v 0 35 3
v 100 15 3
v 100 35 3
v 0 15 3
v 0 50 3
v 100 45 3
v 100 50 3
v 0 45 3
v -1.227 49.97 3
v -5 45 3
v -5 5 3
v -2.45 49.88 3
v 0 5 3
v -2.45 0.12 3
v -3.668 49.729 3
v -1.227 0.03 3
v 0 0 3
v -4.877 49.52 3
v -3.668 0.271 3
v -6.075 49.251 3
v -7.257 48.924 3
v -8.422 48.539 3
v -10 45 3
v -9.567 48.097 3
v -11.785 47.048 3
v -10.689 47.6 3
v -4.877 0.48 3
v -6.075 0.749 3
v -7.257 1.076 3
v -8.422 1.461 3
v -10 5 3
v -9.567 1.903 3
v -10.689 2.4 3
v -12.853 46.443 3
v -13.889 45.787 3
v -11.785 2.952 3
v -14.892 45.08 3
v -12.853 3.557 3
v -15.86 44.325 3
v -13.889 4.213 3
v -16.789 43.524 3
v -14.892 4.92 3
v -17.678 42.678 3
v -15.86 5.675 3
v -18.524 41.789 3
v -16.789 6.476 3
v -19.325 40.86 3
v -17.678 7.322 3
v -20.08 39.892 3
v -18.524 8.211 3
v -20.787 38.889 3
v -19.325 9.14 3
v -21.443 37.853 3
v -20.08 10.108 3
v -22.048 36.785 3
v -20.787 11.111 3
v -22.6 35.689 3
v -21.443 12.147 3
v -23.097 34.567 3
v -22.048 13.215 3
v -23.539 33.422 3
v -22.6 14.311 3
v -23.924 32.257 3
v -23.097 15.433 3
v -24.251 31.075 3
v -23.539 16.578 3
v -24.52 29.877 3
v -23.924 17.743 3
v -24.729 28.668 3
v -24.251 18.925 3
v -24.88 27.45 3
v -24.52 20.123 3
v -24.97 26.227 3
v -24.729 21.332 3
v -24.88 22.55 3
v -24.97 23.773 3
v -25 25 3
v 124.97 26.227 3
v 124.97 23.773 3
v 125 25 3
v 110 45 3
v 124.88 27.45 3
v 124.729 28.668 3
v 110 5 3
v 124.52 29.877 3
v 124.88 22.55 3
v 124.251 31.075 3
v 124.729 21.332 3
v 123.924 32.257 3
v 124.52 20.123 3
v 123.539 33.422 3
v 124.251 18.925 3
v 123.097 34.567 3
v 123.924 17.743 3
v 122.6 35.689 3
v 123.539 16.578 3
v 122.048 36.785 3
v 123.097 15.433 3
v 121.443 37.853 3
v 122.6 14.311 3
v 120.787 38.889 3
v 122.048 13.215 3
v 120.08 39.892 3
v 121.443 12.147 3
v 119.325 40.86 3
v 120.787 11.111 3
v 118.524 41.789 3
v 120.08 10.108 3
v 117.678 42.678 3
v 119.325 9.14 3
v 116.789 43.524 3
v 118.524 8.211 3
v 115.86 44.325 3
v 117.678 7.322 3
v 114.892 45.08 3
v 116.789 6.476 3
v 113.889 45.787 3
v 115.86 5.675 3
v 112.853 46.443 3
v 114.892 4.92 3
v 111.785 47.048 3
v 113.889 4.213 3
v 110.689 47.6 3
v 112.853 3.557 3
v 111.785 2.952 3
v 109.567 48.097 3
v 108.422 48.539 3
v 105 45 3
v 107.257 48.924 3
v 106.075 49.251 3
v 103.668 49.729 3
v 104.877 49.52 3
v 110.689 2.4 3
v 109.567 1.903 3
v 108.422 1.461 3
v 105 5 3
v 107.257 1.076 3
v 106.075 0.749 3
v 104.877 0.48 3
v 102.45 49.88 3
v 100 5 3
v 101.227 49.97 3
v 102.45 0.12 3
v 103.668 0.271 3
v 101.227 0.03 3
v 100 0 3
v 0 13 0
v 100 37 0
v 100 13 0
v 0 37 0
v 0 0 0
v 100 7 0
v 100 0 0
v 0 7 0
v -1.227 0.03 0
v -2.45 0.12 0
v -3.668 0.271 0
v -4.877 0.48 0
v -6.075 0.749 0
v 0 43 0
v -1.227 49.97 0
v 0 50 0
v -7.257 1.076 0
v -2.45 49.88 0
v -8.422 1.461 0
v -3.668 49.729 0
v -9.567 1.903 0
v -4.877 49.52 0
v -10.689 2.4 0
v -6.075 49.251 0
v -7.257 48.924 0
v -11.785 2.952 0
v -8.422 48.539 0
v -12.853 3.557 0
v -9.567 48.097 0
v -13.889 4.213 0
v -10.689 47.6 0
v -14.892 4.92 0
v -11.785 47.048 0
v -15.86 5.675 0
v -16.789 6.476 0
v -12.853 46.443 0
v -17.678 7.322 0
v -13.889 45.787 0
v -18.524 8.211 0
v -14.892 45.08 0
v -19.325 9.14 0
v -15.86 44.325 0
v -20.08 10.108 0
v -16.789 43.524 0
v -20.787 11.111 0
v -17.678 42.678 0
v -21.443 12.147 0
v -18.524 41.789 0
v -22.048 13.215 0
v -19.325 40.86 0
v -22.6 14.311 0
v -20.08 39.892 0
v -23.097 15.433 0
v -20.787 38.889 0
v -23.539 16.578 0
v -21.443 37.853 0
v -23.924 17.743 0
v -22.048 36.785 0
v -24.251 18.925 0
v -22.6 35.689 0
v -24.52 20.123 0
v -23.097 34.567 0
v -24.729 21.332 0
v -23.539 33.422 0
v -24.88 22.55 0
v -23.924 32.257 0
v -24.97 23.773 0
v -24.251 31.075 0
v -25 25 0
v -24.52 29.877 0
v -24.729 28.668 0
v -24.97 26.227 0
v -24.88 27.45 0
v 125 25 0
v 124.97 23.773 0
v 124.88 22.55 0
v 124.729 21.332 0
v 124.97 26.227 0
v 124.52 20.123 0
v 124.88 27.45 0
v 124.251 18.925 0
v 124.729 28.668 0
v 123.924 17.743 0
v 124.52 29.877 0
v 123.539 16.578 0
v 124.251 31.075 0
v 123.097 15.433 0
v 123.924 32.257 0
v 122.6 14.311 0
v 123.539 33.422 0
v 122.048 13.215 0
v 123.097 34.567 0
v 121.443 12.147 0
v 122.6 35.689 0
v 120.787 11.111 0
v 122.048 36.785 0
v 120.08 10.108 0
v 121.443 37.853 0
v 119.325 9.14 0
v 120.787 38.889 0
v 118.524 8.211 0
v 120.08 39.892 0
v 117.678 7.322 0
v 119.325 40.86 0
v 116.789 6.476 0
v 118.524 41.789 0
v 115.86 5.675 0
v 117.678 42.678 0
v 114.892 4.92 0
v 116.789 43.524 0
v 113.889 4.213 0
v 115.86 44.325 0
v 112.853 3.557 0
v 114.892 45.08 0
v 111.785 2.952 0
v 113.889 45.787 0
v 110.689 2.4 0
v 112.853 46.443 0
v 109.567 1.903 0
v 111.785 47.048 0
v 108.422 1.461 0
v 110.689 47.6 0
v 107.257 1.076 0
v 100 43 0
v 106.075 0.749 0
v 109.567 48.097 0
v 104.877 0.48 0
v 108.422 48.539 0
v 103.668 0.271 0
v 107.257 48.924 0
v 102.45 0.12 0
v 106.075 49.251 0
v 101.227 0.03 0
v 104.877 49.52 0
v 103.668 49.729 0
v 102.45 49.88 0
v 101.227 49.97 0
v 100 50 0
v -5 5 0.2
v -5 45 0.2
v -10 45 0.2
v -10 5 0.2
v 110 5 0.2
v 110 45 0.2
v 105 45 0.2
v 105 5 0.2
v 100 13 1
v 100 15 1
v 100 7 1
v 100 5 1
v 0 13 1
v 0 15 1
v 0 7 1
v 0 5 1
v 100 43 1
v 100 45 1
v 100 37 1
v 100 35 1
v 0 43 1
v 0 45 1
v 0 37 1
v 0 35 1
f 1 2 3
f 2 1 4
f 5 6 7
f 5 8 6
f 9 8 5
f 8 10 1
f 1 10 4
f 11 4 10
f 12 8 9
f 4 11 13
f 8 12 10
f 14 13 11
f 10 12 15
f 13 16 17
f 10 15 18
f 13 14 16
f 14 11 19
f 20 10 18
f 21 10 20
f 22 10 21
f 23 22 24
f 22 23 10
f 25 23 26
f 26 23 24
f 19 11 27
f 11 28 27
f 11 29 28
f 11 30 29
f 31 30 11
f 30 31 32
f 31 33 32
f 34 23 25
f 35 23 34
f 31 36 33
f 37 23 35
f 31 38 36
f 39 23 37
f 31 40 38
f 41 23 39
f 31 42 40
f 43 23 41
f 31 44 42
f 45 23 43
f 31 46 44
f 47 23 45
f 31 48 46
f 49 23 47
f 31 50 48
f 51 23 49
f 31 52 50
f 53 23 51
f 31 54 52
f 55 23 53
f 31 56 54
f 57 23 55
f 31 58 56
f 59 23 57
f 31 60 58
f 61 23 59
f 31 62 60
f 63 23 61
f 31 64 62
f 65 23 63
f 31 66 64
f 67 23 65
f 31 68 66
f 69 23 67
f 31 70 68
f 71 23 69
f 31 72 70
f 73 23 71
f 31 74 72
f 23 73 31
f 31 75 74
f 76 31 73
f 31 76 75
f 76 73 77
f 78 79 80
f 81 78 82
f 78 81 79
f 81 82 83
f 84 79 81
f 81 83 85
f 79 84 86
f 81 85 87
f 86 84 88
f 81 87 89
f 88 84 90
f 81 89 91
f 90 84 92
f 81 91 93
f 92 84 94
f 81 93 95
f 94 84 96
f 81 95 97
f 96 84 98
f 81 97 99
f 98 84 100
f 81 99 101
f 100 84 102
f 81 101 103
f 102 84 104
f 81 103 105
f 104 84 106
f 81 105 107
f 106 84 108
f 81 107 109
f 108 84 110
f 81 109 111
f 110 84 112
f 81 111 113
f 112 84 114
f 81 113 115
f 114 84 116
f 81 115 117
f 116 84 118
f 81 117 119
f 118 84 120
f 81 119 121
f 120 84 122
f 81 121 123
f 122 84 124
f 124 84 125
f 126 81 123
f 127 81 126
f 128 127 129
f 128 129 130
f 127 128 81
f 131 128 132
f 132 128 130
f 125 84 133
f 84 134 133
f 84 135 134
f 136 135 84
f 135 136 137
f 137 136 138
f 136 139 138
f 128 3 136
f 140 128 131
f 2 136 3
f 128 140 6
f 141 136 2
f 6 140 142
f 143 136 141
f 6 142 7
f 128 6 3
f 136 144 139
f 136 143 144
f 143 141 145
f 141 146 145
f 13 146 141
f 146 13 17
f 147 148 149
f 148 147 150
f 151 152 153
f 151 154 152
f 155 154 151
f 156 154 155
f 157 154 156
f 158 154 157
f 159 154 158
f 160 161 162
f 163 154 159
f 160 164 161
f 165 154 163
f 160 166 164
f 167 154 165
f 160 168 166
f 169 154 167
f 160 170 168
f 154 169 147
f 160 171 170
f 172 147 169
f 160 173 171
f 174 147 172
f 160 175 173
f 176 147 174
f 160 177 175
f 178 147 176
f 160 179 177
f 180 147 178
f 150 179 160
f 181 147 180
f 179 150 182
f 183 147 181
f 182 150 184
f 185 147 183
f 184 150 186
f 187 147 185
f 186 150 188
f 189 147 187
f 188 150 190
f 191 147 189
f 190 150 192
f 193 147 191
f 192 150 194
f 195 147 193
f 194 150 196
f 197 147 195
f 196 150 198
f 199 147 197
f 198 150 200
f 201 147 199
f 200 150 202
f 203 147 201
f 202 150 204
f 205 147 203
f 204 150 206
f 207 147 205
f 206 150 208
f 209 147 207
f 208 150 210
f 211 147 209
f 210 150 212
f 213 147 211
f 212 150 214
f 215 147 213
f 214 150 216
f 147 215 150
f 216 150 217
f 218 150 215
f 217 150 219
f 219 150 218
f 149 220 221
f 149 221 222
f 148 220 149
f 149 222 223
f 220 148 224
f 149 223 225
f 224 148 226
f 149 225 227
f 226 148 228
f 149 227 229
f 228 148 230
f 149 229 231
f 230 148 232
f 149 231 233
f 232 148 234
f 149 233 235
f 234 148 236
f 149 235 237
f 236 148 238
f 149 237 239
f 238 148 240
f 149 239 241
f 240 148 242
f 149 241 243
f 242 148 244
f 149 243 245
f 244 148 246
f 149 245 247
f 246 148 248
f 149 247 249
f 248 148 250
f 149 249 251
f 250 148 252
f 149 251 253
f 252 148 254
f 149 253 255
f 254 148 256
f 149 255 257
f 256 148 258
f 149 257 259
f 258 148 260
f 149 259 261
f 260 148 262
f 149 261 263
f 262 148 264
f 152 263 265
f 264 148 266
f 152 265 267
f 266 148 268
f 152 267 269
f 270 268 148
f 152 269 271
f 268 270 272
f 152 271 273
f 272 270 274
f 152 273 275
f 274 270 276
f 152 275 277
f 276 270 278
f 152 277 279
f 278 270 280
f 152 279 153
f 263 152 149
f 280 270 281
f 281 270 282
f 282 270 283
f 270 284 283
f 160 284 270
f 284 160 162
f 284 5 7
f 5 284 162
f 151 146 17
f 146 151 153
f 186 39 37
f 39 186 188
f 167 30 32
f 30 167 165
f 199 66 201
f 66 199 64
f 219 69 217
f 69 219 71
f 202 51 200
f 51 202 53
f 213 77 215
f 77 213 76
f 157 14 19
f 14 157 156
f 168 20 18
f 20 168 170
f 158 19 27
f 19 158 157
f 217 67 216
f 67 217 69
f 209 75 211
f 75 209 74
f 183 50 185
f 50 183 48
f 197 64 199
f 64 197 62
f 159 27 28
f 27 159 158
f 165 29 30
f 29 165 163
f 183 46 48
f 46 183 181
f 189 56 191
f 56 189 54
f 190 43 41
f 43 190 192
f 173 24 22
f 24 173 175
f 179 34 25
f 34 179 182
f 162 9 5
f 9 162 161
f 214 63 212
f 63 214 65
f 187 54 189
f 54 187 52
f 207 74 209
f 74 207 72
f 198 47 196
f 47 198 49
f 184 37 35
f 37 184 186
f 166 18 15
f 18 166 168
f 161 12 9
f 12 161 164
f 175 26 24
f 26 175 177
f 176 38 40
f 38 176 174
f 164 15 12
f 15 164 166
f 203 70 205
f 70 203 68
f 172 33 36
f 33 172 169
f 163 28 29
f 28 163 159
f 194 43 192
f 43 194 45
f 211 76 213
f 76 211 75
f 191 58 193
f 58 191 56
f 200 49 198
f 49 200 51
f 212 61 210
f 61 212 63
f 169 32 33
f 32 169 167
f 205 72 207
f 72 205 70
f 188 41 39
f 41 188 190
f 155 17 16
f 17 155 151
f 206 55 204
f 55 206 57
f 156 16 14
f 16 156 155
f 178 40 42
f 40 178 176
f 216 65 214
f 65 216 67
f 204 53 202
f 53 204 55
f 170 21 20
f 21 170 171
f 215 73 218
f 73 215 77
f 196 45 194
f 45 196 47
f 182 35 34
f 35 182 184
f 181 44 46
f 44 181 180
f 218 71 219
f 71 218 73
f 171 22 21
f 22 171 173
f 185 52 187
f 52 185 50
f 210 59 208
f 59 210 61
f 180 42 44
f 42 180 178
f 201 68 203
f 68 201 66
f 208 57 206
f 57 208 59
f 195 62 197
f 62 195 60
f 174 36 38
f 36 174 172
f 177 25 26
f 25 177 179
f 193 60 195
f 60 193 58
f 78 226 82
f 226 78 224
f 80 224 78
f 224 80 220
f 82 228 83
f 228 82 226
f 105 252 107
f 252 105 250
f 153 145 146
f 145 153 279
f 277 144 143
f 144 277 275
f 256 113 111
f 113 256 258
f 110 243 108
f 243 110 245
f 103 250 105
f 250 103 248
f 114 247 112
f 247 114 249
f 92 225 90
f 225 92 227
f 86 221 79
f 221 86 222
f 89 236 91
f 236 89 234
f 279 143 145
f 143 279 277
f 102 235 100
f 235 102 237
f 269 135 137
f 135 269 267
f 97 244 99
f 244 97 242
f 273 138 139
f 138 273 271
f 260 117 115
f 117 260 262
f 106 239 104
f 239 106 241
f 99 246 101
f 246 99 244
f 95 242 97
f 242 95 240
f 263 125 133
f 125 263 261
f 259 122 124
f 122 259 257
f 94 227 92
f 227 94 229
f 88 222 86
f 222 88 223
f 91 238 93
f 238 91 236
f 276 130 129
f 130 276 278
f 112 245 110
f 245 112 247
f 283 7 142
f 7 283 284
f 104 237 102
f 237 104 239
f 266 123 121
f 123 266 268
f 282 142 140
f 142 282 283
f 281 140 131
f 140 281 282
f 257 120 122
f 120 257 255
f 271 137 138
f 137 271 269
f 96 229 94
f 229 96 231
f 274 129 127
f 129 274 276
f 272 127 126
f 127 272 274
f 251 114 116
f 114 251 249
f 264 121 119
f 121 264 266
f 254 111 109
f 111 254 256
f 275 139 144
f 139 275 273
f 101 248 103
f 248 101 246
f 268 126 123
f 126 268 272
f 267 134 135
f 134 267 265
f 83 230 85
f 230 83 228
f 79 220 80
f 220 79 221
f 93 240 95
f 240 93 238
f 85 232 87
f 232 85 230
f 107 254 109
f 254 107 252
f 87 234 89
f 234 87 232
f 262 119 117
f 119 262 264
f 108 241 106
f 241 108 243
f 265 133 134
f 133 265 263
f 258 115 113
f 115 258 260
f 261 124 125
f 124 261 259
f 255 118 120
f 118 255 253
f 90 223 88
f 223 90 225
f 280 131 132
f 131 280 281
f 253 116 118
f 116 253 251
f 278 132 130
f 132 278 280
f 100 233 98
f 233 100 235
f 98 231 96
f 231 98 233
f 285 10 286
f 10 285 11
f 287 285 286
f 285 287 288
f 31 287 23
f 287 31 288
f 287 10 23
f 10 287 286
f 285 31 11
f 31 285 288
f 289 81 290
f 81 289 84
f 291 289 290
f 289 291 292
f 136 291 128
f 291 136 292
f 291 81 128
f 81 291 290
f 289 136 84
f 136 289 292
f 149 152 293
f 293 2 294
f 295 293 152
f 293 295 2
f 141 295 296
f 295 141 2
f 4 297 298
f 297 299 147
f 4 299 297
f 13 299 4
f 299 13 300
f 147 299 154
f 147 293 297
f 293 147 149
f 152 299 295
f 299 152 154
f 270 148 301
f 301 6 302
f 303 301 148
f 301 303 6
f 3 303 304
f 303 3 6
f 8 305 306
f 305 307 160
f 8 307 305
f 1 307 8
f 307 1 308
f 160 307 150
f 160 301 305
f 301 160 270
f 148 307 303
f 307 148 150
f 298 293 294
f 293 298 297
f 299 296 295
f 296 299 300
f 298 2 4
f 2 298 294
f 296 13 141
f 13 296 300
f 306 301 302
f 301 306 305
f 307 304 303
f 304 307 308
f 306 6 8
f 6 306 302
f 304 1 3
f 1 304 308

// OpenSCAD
$fn=128; 
 difference(){
  union(){
 cube([100,50,3]);
 translate([0,25,0]) cylinder(3,25,25);
 translate([100,25,0]) cylinder(3,25,25);
}
 translate([-10,5,0.2]) cube([5,40,3]);
 translate([105,5,0.2]) cube([5,40,3]);
 translate([0,7,-1]) cube([100,6,5]);
 translate([0,37,-1]) cube([100,6,5]);
 translate([0,5,1]) cube([100,10,2]);
 translate([0,35,1]) cube([100,10,2]);
}
